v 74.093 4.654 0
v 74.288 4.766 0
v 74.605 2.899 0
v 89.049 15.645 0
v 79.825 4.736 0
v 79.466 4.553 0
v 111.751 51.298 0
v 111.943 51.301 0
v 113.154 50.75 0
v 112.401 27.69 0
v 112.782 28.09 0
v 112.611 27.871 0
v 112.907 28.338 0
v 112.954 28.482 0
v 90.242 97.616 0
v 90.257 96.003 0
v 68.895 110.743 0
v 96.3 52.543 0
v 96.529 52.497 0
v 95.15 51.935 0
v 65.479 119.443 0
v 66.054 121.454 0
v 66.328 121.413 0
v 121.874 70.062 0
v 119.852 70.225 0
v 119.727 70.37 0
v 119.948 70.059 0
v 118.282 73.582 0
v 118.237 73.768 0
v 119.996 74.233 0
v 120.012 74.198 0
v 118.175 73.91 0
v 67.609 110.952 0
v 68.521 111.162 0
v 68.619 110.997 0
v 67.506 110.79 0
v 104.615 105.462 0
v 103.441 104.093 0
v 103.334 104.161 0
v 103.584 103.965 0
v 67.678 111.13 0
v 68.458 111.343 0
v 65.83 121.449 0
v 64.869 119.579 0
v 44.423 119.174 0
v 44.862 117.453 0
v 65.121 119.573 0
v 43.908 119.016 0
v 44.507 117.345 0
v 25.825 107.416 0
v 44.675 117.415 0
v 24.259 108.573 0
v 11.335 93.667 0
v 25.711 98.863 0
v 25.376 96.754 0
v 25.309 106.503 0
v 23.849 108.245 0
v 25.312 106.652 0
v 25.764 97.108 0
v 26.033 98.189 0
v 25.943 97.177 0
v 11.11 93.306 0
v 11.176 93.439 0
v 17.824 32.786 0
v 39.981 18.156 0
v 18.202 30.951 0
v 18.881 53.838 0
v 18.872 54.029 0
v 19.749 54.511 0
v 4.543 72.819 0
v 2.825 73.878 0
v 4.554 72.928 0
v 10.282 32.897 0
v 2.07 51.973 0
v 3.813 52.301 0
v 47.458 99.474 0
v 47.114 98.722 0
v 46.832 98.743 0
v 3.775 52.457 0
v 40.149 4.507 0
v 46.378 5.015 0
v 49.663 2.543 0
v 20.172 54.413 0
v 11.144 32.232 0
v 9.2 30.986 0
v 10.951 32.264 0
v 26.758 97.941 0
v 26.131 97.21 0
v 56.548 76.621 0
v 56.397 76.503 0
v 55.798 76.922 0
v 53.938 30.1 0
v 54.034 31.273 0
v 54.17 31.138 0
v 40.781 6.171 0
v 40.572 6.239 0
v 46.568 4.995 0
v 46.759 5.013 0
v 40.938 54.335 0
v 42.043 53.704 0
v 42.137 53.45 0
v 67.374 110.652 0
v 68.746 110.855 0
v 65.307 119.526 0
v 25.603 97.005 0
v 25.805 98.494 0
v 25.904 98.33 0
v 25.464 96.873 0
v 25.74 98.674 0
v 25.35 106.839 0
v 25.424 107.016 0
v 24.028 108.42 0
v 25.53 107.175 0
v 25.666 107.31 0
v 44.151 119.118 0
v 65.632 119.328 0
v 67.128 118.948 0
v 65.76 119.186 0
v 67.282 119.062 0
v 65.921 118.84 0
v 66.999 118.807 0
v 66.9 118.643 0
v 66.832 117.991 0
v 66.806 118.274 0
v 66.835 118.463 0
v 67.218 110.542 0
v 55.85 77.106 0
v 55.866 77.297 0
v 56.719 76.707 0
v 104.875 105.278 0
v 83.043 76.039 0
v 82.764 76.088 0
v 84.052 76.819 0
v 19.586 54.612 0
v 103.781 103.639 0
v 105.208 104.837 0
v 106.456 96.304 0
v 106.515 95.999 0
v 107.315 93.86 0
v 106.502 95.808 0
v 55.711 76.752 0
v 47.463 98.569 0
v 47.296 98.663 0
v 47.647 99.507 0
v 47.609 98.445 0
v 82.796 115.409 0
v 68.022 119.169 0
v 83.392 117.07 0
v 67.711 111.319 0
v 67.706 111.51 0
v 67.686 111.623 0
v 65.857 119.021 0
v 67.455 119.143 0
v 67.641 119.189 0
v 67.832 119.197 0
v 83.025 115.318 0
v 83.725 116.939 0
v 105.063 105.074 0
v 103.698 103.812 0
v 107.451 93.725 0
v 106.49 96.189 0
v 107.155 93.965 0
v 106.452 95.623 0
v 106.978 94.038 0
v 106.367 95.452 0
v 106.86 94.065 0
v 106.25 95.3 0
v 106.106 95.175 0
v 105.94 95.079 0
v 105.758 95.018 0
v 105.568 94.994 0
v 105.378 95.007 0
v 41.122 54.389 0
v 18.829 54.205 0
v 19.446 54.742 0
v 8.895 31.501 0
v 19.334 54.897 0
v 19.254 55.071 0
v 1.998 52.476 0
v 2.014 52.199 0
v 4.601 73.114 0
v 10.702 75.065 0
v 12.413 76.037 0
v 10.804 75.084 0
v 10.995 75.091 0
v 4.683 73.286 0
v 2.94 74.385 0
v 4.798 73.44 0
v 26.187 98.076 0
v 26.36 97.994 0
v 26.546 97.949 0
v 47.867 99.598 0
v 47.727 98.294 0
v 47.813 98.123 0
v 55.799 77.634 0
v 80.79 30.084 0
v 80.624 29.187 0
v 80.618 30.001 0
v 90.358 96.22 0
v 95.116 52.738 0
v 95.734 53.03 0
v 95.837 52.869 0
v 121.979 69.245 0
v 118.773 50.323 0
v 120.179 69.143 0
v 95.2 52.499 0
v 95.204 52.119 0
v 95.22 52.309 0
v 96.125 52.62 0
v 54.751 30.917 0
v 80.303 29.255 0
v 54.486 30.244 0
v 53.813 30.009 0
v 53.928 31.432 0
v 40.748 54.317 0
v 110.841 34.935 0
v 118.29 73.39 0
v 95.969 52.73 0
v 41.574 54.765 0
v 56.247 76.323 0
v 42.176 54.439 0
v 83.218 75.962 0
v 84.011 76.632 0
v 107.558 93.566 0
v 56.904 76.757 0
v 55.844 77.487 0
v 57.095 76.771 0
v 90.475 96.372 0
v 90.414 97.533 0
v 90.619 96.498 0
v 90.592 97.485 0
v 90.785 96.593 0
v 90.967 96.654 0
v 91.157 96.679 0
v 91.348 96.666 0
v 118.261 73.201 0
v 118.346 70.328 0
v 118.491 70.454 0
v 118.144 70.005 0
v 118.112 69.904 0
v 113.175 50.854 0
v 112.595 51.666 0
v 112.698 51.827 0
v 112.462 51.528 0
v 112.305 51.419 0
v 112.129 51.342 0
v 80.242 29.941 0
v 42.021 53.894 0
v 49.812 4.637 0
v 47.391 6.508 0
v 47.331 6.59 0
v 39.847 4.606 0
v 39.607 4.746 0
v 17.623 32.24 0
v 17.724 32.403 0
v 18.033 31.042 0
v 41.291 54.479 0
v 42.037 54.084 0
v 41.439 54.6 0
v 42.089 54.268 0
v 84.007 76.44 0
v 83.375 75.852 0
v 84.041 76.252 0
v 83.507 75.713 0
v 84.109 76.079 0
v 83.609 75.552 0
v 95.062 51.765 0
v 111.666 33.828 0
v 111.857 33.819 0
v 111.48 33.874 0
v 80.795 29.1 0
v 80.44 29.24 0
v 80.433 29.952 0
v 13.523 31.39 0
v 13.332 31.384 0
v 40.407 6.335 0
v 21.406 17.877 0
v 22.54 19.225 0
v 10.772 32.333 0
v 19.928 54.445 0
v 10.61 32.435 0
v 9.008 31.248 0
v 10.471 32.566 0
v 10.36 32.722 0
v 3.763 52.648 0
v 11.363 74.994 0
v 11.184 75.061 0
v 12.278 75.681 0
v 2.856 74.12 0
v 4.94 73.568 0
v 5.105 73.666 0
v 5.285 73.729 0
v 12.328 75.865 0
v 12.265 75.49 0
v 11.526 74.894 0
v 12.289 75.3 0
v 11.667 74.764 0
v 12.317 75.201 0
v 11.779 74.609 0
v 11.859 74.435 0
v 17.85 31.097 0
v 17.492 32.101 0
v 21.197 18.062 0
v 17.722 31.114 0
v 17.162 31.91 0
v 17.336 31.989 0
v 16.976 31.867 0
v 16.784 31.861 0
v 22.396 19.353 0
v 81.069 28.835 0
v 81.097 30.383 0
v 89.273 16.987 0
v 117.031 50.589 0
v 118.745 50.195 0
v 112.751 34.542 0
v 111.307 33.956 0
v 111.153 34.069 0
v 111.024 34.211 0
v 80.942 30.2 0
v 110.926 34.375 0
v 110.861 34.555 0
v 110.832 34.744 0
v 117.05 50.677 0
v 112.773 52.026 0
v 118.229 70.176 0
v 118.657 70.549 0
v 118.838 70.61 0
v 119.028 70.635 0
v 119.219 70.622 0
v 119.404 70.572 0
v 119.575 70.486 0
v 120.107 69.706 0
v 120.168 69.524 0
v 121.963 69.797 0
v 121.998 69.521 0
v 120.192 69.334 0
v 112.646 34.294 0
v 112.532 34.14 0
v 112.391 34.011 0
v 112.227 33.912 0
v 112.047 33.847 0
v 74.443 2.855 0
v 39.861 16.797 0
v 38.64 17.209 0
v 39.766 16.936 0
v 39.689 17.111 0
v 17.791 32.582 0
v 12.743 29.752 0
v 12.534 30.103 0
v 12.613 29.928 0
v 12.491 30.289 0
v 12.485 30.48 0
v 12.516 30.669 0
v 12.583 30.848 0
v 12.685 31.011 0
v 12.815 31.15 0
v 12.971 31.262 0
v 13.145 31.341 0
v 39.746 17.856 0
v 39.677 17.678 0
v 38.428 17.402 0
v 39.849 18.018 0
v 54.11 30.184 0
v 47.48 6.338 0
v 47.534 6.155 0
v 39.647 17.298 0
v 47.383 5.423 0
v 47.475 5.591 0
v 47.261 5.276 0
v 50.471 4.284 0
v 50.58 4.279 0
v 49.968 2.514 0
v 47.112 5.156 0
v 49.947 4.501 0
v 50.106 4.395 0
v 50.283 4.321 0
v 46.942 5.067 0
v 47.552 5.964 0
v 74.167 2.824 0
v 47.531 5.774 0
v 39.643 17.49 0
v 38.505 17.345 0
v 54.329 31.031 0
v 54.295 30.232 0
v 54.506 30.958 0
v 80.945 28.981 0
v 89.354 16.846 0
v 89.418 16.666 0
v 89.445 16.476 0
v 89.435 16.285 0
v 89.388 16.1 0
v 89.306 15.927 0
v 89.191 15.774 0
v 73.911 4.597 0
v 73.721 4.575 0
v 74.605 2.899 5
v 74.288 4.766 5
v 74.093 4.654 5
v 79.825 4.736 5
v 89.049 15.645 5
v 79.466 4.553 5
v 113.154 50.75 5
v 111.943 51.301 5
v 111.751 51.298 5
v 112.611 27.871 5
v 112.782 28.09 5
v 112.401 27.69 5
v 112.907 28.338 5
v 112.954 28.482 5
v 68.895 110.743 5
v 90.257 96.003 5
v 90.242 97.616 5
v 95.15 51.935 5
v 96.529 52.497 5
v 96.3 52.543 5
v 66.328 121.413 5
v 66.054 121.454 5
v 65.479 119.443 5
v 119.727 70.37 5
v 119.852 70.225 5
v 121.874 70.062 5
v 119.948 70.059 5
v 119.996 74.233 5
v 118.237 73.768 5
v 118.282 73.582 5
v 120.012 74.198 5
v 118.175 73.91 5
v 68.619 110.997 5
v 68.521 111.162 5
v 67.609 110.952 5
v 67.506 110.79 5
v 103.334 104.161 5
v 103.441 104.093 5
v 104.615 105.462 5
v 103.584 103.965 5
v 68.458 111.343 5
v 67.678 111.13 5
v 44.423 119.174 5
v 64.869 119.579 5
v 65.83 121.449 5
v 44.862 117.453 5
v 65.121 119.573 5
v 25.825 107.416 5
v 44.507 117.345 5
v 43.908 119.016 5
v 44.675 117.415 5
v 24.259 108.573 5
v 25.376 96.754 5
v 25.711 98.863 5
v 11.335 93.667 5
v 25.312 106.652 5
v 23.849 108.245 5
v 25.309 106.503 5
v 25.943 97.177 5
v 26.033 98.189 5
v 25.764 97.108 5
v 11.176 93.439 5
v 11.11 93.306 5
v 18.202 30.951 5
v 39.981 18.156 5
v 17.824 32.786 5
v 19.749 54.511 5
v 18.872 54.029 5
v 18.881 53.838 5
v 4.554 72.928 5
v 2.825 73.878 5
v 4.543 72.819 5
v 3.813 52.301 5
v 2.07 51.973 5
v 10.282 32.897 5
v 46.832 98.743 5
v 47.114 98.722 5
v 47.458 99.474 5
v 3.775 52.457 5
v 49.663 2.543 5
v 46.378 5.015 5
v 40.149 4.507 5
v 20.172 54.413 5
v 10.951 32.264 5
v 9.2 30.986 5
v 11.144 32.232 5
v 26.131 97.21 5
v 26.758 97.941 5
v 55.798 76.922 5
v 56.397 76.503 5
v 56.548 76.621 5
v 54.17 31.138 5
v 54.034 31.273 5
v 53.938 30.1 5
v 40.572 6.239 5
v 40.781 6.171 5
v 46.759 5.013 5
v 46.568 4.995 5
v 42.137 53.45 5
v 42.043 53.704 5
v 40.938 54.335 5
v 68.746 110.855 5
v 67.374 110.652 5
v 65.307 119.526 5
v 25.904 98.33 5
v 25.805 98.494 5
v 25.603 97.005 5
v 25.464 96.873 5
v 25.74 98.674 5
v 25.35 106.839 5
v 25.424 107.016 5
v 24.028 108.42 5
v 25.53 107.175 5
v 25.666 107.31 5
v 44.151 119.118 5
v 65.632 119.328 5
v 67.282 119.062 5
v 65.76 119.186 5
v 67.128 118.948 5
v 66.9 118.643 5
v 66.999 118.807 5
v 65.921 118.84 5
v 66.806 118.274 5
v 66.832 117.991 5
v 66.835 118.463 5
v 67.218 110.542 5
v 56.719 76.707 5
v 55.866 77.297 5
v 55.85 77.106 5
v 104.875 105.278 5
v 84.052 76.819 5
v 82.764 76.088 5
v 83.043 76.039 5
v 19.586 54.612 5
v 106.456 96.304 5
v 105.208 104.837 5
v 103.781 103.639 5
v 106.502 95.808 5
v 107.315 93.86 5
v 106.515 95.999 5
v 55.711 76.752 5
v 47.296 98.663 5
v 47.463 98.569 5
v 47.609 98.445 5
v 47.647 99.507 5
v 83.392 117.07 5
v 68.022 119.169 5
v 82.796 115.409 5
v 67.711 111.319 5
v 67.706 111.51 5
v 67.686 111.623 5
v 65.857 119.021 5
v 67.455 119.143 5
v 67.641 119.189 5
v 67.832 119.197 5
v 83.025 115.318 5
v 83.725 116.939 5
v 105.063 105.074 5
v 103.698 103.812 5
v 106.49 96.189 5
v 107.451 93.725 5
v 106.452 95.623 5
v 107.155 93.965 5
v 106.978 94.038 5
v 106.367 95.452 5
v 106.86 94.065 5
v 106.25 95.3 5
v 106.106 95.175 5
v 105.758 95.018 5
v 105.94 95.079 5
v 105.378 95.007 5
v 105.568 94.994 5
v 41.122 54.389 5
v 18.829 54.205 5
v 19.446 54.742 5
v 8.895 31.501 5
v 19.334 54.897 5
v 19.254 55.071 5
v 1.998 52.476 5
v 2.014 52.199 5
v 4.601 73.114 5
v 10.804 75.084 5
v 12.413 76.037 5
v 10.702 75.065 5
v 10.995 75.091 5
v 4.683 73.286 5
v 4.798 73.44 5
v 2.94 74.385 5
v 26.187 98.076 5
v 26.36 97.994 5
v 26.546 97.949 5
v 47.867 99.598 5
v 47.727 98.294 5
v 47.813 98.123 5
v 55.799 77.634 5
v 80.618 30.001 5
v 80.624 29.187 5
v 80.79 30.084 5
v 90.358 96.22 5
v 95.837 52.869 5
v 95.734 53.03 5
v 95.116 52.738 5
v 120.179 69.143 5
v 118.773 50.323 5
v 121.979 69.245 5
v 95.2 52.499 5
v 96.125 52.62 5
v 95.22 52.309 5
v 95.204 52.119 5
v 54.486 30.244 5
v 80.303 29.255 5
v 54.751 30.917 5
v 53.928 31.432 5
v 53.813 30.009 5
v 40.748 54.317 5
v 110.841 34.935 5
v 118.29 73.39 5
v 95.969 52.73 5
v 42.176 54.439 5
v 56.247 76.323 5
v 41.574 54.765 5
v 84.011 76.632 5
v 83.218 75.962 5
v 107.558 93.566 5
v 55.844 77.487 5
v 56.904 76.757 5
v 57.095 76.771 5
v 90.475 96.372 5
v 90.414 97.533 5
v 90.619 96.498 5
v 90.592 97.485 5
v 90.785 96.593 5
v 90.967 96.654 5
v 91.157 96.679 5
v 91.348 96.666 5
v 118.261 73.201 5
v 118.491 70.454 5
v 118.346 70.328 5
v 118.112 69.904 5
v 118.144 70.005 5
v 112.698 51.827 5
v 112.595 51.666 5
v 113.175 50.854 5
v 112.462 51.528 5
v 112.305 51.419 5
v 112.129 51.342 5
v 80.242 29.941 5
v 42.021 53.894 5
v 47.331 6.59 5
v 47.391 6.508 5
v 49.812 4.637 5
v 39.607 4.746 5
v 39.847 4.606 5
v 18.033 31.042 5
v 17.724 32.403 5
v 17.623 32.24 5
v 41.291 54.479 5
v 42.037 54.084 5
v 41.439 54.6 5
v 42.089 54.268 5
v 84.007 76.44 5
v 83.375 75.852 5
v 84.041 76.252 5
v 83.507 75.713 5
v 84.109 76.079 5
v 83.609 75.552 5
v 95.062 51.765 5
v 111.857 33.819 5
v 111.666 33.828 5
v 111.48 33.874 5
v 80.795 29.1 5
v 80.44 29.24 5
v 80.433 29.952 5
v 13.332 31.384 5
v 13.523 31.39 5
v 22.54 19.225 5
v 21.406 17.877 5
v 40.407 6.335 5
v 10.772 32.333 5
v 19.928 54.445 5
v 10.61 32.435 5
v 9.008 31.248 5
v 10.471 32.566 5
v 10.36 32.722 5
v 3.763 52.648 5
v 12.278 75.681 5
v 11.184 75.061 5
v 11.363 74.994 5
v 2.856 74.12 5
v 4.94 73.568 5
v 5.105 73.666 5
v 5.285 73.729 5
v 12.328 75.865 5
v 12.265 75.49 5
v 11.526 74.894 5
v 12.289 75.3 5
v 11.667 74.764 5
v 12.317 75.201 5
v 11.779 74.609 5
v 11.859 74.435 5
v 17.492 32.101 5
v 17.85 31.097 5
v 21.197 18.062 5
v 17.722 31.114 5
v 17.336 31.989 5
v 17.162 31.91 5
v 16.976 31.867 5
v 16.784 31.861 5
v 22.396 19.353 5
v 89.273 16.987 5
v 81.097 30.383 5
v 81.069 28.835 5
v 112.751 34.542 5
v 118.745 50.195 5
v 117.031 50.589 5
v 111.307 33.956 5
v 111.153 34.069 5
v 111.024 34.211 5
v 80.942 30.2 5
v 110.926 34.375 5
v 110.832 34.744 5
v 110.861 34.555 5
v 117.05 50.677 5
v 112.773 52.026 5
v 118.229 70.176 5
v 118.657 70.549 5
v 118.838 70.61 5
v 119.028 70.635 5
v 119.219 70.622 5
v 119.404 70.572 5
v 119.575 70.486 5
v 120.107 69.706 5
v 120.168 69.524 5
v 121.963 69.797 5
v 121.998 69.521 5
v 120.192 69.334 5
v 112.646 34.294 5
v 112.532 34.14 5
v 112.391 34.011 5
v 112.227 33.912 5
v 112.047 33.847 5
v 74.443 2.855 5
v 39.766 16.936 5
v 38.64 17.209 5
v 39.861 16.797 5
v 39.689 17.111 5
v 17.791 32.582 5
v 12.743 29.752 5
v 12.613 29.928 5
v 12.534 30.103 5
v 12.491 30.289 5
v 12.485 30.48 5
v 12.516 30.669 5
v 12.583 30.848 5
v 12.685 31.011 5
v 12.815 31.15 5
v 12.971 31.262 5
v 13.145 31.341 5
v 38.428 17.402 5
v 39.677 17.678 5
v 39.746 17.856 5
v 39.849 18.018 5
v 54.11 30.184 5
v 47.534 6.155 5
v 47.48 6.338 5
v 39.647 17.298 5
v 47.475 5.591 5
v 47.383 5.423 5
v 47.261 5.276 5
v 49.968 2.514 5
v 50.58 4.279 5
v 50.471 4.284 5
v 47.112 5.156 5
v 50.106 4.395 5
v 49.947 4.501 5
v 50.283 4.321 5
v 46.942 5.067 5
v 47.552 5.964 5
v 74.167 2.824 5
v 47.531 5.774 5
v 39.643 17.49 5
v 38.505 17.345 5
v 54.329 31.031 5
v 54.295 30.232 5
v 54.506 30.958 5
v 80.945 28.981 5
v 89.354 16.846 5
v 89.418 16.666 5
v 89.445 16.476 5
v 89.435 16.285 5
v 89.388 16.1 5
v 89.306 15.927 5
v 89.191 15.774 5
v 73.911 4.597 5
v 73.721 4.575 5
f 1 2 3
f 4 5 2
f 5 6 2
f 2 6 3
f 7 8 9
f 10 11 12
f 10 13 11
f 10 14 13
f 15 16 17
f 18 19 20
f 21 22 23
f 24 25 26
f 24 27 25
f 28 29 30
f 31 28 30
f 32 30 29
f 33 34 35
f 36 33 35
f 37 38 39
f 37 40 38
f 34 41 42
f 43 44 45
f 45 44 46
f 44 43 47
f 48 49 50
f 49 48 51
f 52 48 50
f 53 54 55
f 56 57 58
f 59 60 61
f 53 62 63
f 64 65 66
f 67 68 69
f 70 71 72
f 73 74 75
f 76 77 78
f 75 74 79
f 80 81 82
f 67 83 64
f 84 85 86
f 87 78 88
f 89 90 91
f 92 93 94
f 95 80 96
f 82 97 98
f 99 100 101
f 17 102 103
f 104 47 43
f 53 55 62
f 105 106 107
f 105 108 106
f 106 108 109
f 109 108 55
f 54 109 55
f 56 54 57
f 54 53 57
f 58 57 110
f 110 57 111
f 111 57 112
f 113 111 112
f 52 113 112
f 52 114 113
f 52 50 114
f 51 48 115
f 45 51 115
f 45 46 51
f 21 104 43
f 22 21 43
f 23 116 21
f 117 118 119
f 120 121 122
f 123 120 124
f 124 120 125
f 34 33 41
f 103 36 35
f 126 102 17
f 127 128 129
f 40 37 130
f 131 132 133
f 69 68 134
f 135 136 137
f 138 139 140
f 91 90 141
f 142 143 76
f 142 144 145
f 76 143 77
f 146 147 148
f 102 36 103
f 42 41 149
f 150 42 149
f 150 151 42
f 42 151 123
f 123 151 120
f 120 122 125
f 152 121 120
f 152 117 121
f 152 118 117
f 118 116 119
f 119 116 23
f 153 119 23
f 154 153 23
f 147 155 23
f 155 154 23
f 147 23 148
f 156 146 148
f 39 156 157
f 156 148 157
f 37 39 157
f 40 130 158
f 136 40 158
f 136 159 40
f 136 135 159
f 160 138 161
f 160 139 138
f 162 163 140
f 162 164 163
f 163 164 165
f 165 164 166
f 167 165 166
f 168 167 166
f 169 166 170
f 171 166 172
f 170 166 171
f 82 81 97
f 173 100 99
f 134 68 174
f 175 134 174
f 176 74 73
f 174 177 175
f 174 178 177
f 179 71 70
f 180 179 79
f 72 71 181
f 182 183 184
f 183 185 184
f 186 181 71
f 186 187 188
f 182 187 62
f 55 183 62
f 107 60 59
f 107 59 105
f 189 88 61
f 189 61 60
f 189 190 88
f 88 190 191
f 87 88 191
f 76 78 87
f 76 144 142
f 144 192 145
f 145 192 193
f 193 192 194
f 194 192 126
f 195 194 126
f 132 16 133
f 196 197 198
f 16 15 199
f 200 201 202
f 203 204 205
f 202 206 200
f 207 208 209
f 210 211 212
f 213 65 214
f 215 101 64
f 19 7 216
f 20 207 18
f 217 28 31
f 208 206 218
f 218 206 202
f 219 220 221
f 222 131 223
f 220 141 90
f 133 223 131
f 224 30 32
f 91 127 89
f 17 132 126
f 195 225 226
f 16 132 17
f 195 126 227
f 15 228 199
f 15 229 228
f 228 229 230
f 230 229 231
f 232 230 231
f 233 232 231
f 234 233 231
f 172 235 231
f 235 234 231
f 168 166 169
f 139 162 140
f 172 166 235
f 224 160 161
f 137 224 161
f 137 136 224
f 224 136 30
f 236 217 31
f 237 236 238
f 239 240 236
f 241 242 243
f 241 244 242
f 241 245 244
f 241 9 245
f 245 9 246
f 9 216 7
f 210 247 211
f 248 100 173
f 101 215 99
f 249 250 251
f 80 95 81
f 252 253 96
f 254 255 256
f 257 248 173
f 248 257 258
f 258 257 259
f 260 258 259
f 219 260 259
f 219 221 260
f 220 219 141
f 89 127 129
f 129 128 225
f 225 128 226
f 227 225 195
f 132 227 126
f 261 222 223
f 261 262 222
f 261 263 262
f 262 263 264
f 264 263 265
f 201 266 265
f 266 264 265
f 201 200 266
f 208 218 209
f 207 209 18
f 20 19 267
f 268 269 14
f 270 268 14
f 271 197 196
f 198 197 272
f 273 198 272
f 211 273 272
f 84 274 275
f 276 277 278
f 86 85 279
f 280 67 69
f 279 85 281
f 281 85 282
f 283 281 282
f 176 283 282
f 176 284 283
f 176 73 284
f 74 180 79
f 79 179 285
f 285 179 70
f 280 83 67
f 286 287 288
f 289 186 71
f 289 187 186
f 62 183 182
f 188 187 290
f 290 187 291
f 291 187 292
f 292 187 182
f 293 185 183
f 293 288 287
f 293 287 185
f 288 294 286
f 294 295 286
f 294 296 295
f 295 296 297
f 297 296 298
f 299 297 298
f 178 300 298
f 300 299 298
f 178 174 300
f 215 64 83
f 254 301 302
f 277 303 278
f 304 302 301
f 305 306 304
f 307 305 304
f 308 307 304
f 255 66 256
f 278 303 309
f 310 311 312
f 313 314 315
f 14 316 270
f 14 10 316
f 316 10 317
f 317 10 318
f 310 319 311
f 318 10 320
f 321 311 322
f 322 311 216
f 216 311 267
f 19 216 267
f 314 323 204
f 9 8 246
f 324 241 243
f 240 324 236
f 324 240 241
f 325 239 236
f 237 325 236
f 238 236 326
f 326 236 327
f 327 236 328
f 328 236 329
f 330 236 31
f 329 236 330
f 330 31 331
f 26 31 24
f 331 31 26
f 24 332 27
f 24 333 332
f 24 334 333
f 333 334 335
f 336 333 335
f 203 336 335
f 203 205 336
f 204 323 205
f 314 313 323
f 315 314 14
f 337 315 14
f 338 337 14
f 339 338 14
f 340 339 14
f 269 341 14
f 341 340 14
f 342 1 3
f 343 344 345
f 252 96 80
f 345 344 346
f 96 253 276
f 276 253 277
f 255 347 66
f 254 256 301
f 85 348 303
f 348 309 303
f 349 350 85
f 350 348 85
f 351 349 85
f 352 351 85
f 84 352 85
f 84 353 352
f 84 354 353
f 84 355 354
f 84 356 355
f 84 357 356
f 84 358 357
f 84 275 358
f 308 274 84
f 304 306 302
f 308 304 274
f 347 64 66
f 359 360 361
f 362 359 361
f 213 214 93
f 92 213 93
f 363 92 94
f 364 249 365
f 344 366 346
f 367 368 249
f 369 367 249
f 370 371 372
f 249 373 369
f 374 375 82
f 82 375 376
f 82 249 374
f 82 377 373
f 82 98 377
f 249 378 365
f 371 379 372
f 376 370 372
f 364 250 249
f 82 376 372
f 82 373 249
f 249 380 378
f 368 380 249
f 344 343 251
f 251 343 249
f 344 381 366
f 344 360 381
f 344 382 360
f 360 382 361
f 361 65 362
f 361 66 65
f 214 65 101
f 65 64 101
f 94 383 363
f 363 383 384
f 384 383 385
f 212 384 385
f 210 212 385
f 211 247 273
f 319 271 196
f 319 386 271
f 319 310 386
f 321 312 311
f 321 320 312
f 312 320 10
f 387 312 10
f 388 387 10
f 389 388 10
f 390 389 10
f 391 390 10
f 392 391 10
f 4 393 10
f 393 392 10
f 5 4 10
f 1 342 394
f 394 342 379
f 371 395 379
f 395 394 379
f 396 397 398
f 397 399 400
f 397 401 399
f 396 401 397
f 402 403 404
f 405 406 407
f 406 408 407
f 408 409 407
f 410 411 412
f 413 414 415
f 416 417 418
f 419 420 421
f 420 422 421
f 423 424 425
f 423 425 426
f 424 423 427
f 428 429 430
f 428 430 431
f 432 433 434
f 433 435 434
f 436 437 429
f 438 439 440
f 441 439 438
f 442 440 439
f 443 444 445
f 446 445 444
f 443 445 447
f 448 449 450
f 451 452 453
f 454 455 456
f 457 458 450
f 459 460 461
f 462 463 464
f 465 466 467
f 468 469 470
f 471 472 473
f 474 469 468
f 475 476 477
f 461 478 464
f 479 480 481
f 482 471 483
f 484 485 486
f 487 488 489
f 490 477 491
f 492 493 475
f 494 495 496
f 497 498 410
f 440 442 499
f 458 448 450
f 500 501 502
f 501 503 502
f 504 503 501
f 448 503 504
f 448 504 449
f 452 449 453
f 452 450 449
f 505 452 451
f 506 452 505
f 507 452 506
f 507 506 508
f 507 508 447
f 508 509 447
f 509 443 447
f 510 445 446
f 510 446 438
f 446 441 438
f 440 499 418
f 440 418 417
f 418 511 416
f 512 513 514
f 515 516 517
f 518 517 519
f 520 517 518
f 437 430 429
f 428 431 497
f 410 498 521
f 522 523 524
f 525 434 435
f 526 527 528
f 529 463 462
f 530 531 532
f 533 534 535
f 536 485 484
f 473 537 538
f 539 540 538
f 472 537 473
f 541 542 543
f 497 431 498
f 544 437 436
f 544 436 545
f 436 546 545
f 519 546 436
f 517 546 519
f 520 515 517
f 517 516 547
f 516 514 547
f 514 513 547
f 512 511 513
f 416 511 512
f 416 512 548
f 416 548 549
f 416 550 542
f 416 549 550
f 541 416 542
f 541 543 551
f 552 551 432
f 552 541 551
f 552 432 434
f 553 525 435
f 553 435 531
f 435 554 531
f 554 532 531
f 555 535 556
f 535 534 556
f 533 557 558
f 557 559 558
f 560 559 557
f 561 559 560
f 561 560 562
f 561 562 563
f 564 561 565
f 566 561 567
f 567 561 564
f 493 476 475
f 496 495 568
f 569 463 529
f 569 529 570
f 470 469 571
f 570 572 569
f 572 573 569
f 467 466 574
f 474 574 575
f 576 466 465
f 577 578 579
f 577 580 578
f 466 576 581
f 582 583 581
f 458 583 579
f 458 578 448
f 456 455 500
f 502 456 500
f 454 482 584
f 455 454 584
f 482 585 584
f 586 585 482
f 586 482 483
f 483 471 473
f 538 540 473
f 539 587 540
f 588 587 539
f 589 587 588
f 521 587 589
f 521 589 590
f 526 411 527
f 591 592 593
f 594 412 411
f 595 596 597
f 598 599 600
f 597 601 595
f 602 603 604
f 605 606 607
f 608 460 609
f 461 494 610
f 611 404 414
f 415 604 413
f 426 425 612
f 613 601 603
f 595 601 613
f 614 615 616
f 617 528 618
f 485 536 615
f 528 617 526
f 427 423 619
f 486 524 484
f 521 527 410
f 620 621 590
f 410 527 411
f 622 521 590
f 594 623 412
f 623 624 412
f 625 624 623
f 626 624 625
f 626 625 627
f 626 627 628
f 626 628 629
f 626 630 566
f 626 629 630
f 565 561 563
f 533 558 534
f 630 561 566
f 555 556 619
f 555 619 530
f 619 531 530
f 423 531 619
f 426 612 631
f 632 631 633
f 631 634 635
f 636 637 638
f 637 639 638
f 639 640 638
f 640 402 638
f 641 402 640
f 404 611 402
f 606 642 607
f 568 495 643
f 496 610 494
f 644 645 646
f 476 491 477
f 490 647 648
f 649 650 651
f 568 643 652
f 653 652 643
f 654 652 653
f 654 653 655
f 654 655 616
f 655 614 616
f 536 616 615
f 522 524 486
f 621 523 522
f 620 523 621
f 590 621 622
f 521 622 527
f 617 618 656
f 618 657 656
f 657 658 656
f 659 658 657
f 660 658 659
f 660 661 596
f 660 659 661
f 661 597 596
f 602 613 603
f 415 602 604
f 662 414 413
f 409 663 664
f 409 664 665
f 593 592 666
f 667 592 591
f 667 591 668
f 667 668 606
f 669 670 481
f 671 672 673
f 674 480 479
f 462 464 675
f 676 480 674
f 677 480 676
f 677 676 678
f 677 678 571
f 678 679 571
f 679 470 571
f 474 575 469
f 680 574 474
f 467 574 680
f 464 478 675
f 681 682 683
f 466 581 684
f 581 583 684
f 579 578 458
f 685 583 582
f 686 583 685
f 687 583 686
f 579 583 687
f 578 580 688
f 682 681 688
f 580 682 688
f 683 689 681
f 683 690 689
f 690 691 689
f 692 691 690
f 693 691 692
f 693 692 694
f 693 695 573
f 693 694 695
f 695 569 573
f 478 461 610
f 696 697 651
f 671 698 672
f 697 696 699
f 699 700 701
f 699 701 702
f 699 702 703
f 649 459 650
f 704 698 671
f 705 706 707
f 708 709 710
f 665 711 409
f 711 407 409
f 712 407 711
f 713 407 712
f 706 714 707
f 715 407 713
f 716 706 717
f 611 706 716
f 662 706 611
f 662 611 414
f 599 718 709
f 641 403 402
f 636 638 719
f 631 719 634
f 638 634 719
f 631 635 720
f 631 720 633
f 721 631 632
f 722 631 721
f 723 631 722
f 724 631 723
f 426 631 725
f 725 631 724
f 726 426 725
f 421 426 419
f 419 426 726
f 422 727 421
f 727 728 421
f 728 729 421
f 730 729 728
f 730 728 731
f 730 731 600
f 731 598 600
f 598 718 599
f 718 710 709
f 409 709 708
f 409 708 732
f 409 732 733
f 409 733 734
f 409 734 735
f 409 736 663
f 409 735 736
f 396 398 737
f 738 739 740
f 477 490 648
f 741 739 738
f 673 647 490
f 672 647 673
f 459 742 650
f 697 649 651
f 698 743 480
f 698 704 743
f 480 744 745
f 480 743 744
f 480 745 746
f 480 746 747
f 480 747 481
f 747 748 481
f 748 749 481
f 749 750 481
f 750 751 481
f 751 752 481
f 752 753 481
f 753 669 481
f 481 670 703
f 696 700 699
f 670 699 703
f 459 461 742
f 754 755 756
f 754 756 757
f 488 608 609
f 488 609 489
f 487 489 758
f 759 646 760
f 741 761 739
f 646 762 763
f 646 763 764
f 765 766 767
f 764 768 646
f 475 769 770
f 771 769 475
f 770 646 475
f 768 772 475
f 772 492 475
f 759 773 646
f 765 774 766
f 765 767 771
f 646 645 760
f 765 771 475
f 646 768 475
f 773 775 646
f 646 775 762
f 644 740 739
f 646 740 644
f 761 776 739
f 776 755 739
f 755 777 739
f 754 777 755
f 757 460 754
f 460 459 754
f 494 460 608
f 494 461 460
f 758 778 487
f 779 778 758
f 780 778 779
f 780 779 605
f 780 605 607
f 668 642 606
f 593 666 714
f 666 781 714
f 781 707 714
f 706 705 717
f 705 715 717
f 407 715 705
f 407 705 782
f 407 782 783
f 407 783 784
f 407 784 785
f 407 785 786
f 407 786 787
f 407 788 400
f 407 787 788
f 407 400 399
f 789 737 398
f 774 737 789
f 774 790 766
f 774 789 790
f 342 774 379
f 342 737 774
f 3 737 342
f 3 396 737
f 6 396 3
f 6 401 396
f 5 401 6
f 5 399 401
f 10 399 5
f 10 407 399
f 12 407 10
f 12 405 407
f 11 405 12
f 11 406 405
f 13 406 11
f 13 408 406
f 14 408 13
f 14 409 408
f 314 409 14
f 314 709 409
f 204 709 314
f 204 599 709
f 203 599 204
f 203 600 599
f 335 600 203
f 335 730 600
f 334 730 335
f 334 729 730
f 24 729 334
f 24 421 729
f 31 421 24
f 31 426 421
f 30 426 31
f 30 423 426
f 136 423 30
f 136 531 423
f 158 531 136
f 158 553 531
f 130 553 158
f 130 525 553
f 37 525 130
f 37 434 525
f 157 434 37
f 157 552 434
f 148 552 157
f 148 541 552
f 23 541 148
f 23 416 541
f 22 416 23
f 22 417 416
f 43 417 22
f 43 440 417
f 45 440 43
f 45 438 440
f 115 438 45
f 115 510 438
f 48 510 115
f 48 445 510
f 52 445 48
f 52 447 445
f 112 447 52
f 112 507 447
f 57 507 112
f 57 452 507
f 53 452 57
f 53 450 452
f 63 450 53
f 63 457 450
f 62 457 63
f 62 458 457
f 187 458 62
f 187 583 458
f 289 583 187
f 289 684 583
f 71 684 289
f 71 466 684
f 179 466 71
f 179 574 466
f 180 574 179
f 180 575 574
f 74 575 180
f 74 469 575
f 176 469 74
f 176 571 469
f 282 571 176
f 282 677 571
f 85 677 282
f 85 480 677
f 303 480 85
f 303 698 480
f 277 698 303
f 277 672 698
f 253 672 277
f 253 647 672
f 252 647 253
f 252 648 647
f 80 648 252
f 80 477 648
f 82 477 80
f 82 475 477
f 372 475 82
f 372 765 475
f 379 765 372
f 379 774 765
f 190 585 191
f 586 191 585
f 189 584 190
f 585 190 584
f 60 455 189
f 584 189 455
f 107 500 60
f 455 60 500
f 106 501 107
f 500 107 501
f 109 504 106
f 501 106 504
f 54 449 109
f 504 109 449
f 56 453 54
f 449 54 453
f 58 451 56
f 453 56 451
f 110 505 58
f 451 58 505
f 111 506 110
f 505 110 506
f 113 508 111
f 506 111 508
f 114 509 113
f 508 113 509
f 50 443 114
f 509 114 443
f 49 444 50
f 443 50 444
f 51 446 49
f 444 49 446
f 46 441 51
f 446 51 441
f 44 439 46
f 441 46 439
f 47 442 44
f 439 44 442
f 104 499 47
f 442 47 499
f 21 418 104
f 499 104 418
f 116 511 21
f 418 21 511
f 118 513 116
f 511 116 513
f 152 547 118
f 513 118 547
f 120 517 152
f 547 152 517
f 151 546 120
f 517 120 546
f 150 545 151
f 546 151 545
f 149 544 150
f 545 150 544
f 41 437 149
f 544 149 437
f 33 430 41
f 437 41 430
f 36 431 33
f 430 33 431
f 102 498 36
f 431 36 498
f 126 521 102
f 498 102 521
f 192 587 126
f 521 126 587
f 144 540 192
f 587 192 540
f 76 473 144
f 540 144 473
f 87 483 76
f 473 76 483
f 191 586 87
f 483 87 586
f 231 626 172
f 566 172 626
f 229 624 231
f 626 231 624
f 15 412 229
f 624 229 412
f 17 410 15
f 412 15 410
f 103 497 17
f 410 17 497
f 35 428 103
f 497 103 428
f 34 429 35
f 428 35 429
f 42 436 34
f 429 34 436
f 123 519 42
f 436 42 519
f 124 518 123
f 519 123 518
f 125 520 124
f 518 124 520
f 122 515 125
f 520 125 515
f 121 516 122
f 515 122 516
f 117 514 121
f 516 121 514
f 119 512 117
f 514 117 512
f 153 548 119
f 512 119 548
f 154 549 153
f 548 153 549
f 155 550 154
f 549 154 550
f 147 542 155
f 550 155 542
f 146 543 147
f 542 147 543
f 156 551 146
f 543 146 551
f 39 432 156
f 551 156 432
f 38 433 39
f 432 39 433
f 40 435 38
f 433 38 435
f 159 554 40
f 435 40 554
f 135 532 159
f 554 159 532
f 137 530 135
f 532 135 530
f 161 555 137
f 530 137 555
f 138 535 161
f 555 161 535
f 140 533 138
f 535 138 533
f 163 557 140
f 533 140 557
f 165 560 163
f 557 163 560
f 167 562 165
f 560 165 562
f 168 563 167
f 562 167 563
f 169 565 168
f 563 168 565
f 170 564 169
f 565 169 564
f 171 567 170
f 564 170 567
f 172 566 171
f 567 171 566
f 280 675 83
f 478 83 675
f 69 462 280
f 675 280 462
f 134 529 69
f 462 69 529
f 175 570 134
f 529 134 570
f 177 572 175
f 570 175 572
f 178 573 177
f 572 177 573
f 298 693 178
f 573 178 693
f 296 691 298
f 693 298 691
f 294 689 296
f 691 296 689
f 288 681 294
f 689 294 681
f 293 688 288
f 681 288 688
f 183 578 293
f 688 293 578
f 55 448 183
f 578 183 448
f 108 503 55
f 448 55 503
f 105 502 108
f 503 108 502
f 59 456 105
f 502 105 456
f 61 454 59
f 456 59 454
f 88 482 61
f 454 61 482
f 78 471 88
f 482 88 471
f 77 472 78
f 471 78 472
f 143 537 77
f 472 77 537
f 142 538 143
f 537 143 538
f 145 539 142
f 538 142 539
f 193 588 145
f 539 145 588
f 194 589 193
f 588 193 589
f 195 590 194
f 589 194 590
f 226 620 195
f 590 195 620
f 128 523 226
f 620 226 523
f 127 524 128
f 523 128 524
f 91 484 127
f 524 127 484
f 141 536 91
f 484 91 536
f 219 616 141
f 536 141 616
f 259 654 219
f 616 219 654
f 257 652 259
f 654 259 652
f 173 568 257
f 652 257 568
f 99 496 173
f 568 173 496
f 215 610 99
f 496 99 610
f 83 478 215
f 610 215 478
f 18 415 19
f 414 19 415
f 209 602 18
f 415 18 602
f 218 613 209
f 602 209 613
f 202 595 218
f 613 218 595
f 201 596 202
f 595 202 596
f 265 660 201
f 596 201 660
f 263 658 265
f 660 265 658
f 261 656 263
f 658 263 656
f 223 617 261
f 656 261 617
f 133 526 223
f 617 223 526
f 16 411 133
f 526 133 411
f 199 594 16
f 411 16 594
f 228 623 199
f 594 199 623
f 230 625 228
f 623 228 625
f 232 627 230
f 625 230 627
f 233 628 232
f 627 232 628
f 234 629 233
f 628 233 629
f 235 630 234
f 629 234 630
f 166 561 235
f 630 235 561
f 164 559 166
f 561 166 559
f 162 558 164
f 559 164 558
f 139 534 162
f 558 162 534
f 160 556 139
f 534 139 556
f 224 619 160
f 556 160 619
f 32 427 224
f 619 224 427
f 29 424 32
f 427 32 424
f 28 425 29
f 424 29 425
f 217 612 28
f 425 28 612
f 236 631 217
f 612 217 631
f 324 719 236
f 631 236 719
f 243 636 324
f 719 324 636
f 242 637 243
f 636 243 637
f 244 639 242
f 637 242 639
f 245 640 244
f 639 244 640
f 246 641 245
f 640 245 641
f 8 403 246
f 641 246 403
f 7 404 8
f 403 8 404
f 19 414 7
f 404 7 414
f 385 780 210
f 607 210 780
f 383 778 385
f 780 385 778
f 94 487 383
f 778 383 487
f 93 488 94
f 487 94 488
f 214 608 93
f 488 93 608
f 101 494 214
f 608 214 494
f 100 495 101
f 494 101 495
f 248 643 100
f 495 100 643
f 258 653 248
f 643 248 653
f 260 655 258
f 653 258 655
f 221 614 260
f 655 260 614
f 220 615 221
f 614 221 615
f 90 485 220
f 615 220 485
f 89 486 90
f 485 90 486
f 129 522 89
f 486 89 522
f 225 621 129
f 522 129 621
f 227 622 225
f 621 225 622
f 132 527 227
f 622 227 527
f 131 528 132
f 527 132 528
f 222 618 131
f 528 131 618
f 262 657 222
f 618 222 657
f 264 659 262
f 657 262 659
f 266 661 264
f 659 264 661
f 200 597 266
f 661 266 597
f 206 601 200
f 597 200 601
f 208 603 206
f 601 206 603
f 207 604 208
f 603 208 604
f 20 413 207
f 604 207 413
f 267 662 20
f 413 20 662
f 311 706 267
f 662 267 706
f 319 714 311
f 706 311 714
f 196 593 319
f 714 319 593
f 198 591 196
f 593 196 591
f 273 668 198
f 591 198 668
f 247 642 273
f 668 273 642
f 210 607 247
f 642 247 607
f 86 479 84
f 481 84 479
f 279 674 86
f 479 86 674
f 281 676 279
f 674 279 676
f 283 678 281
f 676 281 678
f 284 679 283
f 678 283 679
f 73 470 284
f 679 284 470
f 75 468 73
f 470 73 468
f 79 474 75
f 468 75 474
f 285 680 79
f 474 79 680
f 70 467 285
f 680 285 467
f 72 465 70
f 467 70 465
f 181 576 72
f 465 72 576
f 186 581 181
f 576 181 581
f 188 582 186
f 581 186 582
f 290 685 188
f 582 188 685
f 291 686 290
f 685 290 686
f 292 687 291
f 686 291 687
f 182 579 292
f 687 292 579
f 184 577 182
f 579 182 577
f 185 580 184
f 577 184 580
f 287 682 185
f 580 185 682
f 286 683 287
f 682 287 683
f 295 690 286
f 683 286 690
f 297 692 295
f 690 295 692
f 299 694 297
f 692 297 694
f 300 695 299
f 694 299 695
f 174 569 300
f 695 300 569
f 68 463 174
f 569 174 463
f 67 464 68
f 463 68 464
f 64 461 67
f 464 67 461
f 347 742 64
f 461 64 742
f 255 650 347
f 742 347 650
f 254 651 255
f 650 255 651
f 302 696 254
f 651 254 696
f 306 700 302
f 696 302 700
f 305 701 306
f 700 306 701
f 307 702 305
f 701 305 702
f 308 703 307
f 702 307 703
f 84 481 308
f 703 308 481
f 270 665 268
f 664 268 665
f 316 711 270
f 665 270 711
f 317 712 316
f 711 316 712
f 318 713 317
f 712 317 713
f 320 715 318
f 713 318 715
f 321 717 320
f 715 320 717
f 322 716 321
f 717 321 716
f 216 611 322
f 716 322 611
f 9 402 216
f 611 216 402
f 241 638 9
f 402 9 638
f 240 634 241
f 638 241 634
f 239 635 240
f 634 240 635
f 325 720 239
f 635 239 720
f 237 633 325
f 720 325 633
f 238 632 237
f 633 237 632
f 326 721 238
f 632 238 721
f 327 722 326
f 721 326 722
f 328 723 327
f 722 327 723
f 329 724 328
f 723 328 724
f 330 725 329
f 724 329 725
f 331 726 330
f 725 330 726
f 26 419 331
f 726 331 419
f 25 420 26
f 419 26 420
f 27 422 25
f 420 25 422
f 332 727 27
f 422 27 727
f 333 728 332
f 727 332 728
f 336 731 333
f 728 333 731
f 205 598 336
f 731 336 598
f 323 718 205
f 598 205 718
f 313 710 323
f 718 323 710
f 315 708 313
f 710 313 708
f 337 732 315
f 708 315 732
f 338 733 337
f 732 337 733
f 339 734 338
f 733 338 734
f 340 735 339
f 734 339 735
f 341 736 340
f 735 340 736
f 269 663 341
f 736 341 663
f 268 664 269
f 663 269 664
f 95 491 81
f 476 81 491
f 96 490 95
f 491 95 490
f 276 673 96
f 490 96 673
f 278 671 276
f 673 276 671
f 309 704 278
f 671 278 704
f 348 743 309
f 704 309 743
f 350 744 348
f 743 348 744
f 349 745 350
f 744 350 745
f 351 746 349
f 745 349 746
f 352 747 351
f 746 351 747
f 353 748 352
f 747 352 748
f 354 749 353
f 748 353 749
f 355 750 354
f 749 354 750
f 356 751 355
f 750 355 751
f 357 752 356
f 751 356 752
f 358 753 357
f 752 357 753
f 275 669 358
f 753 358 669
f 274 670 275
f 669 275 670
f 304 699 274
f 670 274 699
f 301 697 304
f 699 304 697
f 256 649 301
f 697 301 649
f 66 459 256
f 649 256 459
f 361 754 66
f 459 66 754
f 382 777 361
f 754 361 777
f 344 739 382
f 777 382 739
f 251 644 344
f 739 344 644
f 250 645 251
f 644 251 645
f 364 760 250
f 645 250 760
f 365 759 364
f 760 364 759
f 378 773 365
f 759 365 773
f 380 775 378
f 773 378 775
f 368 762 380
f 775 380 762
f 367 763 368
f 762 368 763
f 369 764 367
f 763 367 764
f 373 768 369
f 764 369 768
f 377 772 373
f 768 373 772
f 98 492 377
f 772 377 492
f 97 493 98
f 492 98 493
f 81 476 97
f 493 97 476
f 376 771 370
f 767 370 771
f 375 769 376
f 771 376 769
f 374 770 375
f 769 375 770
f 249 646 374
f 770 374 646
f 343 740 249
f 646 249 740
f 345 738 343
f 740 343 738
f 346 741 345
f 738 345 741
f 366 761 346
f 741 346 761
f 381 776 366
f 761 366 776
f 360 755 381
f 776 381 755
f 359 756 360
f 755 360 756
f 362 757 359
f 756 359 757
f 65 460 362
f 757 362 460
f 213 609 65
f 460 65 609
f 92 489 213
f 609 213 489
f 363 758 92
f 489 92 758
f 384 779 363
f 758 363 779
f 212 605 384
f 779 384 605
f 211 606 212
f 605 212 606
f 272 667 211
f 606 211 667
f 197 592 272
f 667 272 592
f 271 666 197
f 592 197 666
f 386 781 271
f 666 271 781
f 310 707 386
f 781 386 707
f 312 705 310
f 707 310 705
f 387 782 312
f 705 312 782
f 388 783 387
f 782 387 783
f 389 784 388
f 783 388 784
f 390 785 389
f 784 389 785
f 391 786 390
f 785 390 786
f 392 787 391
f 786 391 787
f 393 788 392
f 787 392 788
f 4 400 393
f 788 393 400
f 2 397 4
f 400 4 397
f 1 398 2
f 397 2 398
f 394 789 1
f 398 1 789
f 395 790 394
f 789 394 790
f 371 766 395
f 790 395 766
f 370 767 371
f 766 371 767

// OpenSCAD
/*
 * Customizable Origami - Football - https://www.thingiverse.com/thing:2644010
 * by Dennis Hofmann - https://www.thingiverse.com/mightynozzle/about
 * created 2017-11-14
 * version v1.0
 *
 * Changelog
 * --------------
 * v1.0:
 *      - final design
 * --------------
 * 
 * This work is licensed under the Creative Commons - Attribution - NonCommercial - ShareAlike license.
 * https://creativecommons.org/licenses/by-nc-sa/3.0/
 */


 // Parameter Section //
//-------------------//

// preview[view:north, tilt:top]

// The maximum size of the longest side. The shorter side will be automatically resized in same ratio.
max_size_in_millimeter = 120; //[20:300]

// The height of the model.
model_height_in_millimeter = 5; //[0.2:0.2:100]

// Thickness of the outer outline.
outline_size_in_millimeter = 1.8; //[0.5:0.1:20]

// Thickness of the inner outline.
inline_size_in_millimeter = 0.7; //[0.5:0.1:20]

// Roundiness of the ends of the inner outlines.
inline_edge_radius_in_millimeter = 1.0; //[0.0:0.1:5]

// Flip model
flip_model = "no"; //[yes,no]

/*[hidden]*/
max_size = max_size_in_millimeter;
model_height = model_height_in_millimeter;
$fn=32;

// Outer Points
A1 = [99, 309];
A2 = [215, 184];
A3 = [391, 57];
A4 = [483, 38];
A5 = [717, 41];
A6 = [764, 57];
A7 = [1079, 279];
A8 = [1135, 489];
A9 = [1166, 672];
A10 = [1148, 712];
A11 = [1005, 1008];
A12 = [803, 1119];
A13 = [638, 1161];
A14 = [431, 1139];
A15 = [241, 1038];
A16 = [120, 897];
A17 = [41, 714];
A18 = [33, 507];

outline = [A1, A2, A3, A4, A5, A6, A7, A8, A9, A10, A11, A12, A13, A14, A15, A16, A17, A18];

// Inner Points
B1 = [175, 304];
B2 = [375, 170];
B3 = [522, 296];
B4 = [401, 522];
B5 = [186, 523];
B6 = [873, 156];
B7 = [783, 286];
B8 = [926, 505];
B9 = [1091, 492];
B10 = [1060, 280];
B11 = [545, 746];
B12 = [808, 739];
B13 = [873, 940];
B14 = [660, 1071];
B15 = [462, 959];
B16 = [246, 943];
B17 = [114, 732];
B18 = [1040, 912];

// Polygons
C1 = [A1, A2, A3, A4, B2, B1];
C2 = [B2, A4, A5, B6, B7, B3];
C3 = [A5, A6, A7, B10, B6];
C4 = [A10, B9, B10, A7, A8, A9];
C5 = [B8, B7, B3, B4, B11, B12];
C6 = [B8, B9, A10, B18, B13, B12];
C7 = [A11, B18, A10, A9];
C8 = [A11, B18, B13, B14, A13, A12];
C9 = [B14, B15, B16, A15, A14, A13];
C10 = [B15, B11, B4, B5, B17, B16];
C11 = [B17, B5, B1, A1, A18, A17];

cut_polygons = [C1, C2, C3, C4, C5, C6, C7, C8, C9, C10, C11];

min_x = A18[0];
min_y = A4[1];
max_x = A9[0];
max_y = A13[1];

x_size = max_x - min_x;
y_size = max_y - min_y;

x_factor = max_size / x_size;
y_factor = max_size / y_size;

inline_size = x_size > y_size ? inline_size_in_millimeter / x_factor / 2: inline_size_in_millimeter / y_factor / 2;
inline_edge_radius = x_size > y_size ? inline_edge_radius_in_millimeter / x_factor: inline_edge_radius_in_millimeter / y_factor;
outline_size = x_size > y_size ? outline_size_in_millimeter / x_factor - inline_size: outline_size_in_millimeter / y_factor - inline_size;


 // Program Section //
//-----------------//

if(x_size > y_size) {
    resize(newsize=[max_size, x_factor * y_size, model_height]){
        if(flip_model == "yes") {
            mirror([0,1,0]) {
                rotate([180,180,0]) {    
                    create(outline, cut_polygons);
                }
            }
        } else {
            create(outline, cut_polygons);
        }
    }
} else {
    resize(newsize=[y_factor * x_size, max_size, model_height]){
        if(flip_model == "yes") {
            mirror([0,1,0]) {
                rotate([180,180,0]) {    
                    create(outline, cut_polygons);
                }
            }
        } else {
            create(outline, cut_polygons);
        }
    }
}


 // Module Section //
//----------------//

module create() {
    linear_extrude(height=1) {
        difference() {
            offset(r = -0) {
                offset(r = +outline_size) {
                    polygon(points = outline, convexity = 10);
                }
            }
            
            for(cut_polygon = [0:len(cut_polygons)]) {
                offset(r = +inline_edge_radius) {
                    offset(r = -inline_size - inline_edge_radius) {
                        polygon(points = cut_polygons[cut_polygon], convexity = 10);
                    }
                }
            }
        }
    }
}
